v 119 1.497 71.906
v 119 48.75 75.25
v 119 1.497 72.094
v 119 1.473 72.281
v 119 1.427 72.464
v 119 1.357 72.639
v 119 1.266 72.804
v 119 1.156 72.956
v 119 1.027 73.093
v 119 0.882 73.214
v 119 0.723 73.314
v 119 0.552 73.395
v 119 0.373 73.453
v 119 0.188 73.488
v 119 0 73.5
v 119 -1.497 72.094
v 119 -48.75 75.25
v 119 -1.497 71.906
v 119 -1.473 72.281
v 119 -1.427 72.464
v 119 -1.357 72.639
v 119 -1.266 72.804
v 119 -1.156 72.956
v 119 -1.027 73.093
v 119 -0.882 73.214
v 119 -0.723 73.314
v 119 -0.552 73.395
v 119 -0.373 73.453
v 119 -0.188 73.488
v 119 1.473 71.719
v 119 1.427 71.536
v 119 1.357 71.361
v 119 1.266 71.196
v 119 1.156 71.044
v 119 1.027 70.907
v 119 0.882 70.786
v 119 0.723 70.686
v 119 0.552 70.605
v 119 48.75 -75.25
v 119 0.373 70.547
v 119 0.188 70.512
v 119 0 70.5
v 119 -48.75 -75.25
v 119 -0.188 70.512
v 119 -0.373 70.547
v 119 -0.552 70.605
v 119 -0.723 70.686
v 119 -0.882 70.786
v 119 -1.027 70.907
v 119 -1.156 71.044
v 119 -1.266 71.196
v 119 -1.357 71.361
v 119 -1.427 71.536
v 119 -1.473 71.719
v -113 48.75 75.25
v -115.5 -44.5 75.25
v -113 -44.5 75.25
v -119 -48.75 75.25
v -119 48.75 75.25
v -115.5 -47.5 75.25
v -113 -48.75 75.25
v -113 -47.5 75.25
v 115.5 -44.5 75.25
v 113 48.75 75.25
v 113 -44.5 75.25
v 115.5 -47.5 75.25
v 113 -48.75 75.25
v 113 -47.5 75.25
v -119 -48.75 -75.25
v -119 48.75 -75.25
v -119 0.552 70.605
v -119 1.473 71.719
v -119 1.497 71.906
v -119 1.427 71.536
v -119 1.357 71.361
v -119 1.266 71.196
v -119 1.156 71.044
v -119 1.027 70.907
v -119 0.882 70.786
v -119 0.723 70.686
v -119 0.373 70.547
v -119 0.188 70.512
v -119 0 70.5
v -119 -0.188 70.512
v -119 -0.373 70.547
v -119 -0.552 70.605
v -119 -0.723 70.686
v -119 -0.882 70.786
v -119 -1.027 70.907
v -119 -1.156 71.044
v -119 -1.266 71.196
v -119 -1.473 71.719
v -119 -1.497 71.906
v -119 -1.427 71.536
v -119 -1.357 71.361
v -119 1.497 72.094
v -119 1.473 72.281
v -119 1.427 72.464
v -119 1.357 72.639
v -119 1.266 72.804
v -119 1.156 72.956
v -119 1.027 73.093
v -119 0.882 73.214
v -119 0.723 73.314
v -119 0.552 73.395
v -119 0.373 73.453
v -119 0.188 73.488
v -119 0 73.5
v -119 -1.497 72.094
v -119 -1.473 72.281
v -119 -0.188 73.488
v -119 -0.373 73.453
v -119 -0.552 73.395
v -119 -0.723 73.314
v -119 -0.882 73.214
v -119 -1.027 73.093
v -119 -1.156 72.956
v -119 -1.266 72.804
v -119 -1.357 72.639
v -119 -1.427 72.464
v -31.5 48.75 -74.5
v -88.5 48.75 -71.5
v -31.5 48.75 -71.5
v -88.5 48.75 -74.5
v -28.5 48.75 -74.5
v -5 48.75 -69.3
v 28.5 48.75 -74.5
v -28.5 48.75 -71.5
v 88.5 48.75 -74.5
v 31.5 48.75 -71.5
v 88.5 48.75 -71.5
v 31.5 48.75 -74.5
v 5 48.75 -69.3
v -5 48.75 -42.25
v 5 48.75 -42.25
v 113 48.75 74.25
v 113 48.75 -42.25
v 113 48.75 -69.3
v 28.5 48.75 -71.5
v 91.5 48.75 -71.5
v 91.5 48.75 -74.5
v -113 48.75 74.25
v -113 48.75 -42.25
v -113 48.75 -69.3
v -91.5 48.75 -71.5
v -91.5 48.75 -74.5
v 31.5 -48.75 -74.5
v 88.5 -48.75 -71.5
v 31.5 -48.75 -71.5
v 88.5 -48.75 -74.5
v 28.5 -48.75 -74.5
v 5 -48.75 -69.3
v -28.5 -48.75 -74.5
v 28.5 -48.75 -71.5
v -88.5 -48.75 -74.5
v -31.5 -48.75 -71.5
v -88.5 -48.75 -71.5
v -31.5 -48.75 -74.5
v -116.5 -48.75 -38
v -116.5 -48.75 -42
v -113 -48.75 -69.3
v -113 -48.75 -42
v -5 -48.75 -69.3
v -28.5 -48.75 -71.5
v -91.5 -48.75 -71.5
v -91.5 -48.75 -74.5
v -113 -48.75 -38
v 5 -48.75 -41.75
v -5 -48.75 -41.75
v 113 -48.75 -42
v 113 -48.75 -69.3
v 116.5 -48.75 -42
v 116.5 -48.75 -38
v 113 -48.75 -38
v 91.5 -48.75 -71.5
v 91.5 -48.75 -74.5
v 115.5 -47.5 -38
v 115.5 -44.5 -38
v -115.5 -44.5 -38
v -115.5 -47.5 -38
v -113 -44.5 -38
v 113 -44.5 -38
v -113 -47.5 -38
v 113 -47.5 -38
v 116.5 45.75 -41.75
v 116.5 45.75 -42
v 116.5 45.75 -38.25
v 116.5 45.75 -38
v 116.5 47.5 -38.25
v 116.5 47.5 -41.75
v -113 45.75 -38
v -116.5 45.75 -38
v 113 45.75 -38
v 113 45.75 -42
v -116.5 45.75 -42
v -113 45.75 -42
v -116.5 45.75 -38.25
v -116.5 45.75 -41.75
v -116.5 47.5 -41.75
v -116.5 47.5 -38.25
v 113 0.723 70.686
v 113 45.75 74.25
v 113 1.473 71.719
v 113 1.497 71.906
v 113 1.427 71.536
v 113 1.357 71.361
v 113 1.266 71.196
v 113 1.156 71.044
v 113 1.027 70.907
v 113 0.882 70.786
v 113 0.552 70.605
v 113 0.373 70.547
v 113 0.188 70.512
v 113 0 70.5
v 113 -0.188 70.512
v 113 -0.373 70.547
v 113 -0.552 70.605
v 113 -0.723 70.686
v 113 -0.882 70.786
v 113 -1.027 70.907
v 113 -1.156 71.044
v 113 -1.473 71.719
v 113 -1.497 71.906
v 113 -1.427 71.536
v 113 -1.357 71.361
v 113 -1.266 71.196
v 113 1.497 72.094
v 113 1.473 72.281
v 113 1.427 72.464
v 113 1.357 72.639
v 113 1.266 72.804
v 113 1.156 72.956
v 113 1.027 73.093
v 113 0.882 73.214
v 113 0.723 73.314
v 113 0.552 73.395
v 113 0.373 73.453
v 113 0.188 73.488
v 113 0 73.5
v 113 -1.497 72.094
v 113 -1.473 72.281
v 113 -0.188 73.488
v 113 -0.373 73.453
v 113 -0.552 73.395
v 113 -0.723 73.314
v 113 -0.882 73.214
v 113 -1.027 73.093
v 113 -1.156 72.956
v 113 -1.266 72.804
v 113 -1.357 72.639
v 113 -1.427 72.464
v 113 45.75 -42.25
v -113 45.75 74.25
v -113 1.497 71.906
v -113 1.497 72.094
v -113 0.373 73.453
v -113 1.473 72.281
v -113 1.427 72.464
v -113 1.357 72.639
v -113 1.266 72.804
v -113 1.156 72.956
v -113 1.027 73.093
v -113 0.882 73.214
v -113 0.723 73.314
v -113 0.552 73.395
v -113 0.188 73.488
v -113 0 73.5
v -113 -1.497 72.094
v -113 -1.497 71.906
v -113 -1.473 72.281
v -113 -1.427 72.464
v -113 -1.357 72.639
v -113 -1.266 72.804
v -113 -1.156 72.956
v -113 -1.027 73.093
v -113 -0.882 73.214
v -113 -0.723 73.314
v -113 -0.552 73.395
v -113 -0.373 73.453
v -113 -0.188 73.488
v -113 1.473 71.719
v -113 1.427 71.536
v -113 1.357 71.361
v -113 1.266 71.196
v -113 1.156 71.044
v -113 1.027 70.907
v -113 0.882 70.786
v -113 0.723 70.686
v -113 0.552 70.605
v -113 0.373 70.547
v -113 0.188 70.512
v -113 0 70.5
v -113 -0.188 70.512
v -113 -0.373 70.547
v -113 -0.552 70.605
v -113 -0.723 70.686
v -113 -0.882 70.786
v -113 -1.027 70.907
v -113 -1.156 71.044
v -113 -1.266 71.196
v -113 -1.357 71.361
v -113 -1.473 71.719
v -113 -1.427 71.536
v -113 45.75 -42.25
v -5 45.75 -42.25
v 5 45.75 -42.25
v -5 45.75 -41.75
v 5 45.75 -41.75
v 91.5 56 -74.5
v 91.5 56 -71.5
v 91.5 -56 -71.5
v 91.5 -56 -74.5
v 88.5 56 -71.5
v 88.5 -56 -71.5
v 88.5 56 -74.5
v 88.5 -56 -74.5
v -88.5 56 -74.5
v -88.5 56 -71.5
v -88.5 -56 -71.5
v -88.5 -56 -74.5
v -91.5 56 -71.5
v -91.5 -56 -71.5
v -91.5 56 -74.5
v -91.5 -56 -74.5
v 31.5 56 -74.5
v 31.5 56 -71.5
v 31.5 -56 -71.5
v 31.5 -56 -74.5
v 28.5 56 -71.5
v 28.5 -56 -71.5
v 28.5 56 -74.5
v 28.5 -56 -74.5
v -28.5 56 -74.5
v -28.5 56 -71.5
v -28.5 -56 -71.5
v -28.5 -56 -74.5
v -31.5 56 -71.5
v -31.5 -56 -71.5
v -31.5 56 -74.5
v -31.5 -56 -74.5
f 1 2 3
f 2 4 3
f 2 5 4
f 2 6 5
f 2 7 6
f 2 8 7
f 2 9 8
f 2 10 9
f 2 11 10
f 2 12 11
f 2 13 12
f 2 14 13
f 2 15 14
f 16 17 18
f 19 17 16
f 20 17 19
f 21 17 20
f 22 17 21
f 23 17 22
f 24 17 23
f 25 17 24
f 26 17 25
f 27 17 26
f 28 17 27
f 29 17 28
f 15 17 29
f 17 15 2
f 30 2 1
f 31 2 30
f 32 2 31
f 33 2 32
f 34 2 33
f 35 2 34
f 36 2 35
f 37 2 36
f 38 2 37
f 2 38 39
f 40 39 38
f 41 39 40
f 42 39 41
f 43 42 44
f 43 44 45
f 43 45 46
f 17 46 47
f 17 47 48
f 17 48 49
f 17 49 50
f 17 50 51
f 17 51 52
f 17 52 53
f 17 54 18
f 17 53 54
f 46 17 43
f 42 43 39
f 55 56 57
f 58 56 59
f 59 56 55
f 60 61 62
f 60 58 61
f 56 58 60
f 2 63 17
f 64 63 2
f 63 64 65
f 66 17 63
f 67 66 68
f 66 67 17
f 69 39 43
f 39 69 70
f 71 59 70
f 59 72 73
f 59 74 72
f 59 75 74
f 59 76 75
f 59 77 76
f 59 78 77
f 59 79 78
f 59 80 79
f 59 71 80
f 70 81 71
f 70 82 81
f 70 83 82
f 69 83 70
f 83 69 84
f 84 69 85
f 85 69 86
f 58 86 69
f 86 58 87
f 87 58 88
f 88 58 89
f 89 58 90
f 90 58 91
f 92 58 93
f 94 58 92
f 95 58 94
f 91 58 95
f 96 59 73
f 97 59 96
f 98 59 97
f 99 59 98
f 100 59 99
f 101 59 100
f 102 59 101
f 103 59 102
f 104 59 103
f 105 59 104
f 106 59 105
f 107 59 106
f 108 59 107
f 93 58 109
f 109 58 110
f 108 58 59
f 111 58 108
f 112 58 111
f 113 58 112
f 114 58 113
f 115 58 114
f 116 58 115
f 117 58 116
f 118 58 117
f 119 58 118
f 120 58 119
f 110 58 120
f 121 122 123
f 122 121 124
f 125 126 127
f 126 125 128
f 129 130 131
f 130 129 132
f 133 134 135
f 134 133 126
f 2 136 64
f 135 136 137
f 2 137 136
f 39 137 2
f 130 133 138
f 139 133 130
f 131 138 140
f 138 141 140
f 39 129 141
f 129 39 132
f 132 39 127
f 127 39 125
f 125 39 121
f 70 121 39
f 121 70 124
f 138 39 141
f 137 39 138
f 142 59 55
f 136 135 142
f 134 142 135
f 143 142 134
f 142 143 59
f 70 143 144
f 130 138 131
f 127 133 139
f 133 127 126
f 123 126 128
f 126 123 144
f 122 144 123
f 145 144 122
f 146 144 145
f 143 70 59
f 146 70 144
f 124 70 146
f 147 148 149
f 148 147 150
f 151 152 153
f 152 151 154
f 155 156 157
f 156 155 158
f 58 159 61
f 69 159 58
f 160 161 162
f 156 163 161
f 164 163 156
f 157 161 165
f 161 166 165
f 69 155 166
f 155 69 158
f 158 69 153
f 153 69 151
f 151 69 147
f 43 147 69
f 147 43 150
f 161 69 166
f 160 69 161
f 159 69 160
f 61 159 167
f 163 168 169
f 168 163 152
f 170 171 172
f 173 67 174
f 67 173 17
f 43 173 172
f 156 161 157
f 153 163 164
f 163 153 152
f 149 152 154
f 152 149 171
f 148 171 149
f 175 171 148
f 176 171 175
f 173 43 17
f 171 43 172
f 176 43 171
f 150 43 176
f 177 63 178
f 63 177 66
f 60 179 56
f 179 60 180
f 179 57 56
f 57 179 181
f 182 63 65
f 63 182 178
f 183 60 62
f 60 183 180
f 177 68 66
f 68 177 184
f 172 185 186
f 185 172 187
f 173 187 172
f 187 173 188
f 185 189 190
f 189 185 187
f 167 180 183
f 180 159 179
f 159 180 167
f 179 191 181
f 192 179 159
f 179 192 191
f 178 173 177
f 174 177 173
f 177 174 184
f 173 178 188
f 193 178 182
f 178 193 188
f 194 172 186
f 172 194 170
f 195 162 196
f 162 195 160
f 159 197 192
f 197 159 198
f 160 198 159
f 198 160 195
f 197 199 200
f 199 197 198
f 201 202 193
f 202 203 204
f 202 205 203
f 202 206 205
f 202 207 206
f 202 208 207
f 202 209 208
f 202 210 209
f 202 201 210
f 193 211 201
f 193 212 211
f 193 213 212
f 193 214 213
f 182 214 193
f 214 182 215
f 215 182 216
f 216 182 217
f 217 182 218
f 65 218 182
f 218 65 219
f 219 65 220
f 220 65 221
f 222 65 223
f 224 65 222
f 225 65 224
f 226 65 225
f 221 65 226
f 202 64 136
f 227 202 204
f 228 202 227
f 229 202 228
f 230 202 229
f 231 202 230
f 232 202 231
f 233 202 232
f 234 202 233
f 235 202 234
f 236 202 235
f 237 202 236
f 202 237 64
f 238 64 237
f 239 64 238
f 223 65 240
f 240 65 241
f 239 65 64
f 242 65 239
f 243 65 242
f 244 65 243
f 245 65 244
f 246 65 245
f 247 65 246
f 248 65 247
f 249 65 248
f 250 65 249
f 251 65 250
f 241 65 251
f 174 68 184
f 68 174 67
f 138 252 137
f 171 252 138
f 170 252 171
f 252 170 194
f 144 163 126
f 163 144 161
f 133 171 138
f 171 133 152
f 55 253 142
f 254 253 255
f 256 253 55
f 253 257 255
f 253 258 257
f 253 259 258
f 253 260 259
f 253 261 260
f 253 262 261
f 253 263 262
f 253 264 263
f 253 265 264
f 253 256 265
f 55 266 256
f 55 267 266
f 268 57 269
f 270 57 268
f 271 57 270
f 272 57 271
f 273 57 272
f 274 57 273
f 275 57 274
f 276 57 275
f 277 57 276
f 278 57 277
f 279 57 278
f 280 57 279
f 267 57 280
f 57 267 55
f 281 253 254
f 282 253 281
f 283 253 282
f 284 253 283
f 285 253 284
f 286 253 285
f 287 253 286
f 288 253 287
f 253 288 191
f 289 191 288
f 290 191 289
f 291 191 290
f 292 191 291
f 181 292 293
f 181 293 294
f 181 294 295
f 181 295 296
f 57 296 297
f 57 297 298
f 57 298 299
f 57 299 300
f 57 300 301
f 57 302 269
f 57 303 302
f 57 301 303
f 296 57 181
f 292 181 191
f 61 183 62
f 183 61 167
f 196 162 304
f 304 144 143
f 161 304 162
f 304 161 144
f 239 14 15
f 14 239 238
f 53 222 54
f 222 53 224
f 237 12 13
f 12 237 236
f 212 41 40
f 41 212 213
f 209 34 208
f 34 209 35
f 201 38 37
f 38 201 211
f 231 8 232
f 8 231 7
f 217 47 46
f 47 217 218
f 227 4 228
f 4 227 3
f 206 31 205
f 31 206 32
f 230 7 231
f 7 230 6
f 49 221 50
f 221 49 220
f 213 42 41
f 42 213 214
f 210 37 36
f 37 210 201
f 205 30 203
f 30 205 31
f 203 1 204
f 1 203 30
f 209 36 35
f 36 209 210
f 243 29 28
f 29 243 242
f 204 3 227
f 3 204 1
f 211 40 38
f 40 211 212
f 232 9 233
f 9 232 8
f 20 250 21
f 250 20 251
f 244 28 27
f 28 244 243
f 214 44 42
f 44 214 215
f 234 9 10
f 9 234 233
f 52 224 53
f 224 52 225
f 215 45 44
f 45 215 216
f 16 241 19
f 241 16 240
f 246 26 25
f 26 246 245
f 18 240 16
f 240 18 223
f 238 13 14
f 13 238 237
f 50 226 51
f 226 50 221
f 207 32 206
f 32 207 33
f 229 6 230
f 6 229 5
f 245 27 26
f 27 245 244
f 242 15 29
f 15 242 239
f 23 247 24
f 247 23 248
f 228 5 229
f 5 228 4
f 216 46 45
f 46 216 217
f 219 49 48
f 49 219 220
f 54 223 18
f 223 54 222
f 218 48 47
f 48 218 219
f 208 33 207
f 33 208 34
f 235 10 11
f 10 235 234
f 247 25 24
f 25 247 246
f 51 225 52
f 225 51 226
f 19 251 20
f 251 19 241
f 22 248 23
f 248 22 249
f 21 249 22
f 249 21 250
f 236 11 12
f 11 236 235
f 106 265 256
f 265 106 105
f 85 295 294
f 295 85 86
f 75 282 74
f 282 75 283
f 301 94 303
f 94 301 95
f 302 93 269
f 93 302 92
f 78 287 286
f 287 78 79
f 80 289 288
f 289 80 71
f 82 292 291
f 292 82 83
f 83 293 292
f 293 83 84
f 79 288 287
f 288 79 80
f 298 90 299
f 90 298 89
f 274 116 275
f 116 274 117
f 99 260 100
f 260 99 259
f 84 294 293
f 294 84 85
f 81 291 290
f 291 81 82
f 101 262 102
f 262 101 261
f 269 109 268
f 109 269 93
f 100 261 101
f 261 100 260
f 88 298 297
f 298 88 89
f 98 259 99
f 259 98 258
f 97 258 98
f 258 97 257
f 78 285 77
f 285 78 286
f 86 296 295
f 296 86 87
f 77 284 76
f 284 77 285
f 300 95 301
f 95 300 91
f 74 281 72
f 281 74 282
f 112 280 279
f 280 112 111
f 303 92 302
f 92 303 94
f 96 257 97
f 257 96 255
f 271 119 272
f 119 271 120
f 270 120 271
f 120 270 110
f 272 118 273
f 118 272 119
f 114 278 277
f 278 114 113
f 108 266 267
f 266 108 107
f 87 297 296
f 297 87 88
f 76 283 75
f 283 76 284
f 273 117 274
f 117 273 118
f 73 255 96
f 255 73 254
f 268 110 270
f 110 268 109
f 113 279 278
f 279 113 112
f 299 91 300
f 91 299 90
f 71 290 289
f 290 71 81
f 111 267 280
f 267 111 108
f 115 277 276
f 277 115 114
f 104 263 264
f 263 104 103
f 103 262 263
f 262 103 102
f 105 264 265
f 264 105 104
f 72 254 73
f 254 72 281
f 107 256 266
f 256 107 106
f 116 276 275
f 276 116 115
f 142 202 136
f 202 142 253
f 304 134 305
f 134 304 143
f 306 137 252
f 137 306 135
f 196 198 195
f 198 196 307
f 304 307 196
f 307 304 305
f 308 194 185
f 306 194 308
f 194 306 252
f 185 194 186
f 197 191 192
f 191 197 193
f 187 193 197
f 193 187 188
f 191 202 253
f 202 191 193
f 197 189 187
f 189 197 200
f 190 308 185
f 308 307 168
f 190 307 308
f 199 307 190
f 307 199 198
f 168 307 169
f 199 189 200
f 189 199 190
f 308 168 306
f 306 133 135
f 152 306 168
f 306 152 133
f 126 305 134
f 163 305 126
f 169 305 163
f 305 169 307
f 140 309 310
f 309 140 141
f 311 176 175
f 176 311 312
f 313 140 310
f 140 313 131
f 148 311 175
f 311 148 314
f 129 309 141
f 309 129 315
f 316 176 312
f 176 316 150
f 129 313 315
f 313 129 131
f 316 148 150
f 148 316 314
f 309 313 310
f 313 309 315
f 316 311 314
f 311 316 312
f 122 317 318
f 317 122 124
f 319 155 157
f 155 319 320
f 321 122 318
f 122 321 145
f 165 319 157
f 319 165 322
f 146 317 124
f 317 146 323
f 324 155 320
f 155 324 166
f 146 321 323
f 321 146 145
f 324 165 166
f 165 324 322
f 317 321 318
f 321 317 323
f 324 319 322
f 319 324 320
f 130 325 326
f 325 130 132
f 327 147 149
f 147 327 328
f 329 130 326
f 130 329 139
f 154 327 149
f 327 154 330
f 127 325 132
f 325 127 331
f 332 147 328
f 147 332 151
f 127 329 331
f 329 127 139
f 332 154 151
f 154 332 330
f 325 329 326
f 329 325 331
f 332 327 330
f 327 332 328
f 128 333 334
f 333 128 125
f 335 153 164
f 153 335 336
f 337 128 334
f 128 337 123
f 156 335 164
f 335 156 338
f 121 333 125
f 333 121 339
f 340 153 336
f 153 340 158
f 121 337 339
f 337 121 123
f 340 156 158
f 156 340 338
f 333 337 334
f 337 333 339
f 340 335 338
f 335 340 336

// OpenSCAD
$fn=50;
difference() {translate([0,0,0])cube([220+12+6, 87.5+10, 116.5+6+8+20], center=true);
 
    translate([0,-46,3+18])cube([220+5+6, 3, 116.5+8], center=true);
    translate([0,0,-50+10])cube ([220+5+8,87.5+10,4], center=true);

    translate([0,0,3]) cube ([220+6,87.5+11,116.5+8+20.1], center=true);
    translate([110,0,72])rotate([0,90,0]) cylinder(r=1.5, h=10);//inlet hole
    translate([-120,0,72])rotate([0,90,0]) cylinder(r=1.5, h=10);//inlet hole

}
difference(){translate([0,47.25,3+18-5])cube([220+14
, 3, 116.5], center=true);
    #translate([0,0,-50+10])cube ([230+5+6,84+11,3.5], center=true);
}
difference(){translate([0,0,-55])cube ([10,87.5+10,30], center=true);
    translate([0,0,-50+10])cube ([230+5+6,87.5+18,3.5], center=true);
}
translate([90,0,-73]) cube ([3,92+20,3], center=true);
translate([-90,0,-73]) cube ([3,92+20,3], center=true);
translate([30,0,-73]) cube ([3,92+20,3], center=true);
translate([-30,0,-73]) cube ([3,92+20,3], center=true);

//translate([0,-46,3+18])cube([220+6, 1, 117], center=true); //front cover board

//
//translate([0,0,0])cube([90, 2, 113], center=true);
//translate([0,2,58.])cube([105, 6, 3], center=true);
//#translate([51,2,56.])cube([4, 6, 7], center=true);
//#translate([-51,2,56.])cube([4, 6, 7], center=true); //division
